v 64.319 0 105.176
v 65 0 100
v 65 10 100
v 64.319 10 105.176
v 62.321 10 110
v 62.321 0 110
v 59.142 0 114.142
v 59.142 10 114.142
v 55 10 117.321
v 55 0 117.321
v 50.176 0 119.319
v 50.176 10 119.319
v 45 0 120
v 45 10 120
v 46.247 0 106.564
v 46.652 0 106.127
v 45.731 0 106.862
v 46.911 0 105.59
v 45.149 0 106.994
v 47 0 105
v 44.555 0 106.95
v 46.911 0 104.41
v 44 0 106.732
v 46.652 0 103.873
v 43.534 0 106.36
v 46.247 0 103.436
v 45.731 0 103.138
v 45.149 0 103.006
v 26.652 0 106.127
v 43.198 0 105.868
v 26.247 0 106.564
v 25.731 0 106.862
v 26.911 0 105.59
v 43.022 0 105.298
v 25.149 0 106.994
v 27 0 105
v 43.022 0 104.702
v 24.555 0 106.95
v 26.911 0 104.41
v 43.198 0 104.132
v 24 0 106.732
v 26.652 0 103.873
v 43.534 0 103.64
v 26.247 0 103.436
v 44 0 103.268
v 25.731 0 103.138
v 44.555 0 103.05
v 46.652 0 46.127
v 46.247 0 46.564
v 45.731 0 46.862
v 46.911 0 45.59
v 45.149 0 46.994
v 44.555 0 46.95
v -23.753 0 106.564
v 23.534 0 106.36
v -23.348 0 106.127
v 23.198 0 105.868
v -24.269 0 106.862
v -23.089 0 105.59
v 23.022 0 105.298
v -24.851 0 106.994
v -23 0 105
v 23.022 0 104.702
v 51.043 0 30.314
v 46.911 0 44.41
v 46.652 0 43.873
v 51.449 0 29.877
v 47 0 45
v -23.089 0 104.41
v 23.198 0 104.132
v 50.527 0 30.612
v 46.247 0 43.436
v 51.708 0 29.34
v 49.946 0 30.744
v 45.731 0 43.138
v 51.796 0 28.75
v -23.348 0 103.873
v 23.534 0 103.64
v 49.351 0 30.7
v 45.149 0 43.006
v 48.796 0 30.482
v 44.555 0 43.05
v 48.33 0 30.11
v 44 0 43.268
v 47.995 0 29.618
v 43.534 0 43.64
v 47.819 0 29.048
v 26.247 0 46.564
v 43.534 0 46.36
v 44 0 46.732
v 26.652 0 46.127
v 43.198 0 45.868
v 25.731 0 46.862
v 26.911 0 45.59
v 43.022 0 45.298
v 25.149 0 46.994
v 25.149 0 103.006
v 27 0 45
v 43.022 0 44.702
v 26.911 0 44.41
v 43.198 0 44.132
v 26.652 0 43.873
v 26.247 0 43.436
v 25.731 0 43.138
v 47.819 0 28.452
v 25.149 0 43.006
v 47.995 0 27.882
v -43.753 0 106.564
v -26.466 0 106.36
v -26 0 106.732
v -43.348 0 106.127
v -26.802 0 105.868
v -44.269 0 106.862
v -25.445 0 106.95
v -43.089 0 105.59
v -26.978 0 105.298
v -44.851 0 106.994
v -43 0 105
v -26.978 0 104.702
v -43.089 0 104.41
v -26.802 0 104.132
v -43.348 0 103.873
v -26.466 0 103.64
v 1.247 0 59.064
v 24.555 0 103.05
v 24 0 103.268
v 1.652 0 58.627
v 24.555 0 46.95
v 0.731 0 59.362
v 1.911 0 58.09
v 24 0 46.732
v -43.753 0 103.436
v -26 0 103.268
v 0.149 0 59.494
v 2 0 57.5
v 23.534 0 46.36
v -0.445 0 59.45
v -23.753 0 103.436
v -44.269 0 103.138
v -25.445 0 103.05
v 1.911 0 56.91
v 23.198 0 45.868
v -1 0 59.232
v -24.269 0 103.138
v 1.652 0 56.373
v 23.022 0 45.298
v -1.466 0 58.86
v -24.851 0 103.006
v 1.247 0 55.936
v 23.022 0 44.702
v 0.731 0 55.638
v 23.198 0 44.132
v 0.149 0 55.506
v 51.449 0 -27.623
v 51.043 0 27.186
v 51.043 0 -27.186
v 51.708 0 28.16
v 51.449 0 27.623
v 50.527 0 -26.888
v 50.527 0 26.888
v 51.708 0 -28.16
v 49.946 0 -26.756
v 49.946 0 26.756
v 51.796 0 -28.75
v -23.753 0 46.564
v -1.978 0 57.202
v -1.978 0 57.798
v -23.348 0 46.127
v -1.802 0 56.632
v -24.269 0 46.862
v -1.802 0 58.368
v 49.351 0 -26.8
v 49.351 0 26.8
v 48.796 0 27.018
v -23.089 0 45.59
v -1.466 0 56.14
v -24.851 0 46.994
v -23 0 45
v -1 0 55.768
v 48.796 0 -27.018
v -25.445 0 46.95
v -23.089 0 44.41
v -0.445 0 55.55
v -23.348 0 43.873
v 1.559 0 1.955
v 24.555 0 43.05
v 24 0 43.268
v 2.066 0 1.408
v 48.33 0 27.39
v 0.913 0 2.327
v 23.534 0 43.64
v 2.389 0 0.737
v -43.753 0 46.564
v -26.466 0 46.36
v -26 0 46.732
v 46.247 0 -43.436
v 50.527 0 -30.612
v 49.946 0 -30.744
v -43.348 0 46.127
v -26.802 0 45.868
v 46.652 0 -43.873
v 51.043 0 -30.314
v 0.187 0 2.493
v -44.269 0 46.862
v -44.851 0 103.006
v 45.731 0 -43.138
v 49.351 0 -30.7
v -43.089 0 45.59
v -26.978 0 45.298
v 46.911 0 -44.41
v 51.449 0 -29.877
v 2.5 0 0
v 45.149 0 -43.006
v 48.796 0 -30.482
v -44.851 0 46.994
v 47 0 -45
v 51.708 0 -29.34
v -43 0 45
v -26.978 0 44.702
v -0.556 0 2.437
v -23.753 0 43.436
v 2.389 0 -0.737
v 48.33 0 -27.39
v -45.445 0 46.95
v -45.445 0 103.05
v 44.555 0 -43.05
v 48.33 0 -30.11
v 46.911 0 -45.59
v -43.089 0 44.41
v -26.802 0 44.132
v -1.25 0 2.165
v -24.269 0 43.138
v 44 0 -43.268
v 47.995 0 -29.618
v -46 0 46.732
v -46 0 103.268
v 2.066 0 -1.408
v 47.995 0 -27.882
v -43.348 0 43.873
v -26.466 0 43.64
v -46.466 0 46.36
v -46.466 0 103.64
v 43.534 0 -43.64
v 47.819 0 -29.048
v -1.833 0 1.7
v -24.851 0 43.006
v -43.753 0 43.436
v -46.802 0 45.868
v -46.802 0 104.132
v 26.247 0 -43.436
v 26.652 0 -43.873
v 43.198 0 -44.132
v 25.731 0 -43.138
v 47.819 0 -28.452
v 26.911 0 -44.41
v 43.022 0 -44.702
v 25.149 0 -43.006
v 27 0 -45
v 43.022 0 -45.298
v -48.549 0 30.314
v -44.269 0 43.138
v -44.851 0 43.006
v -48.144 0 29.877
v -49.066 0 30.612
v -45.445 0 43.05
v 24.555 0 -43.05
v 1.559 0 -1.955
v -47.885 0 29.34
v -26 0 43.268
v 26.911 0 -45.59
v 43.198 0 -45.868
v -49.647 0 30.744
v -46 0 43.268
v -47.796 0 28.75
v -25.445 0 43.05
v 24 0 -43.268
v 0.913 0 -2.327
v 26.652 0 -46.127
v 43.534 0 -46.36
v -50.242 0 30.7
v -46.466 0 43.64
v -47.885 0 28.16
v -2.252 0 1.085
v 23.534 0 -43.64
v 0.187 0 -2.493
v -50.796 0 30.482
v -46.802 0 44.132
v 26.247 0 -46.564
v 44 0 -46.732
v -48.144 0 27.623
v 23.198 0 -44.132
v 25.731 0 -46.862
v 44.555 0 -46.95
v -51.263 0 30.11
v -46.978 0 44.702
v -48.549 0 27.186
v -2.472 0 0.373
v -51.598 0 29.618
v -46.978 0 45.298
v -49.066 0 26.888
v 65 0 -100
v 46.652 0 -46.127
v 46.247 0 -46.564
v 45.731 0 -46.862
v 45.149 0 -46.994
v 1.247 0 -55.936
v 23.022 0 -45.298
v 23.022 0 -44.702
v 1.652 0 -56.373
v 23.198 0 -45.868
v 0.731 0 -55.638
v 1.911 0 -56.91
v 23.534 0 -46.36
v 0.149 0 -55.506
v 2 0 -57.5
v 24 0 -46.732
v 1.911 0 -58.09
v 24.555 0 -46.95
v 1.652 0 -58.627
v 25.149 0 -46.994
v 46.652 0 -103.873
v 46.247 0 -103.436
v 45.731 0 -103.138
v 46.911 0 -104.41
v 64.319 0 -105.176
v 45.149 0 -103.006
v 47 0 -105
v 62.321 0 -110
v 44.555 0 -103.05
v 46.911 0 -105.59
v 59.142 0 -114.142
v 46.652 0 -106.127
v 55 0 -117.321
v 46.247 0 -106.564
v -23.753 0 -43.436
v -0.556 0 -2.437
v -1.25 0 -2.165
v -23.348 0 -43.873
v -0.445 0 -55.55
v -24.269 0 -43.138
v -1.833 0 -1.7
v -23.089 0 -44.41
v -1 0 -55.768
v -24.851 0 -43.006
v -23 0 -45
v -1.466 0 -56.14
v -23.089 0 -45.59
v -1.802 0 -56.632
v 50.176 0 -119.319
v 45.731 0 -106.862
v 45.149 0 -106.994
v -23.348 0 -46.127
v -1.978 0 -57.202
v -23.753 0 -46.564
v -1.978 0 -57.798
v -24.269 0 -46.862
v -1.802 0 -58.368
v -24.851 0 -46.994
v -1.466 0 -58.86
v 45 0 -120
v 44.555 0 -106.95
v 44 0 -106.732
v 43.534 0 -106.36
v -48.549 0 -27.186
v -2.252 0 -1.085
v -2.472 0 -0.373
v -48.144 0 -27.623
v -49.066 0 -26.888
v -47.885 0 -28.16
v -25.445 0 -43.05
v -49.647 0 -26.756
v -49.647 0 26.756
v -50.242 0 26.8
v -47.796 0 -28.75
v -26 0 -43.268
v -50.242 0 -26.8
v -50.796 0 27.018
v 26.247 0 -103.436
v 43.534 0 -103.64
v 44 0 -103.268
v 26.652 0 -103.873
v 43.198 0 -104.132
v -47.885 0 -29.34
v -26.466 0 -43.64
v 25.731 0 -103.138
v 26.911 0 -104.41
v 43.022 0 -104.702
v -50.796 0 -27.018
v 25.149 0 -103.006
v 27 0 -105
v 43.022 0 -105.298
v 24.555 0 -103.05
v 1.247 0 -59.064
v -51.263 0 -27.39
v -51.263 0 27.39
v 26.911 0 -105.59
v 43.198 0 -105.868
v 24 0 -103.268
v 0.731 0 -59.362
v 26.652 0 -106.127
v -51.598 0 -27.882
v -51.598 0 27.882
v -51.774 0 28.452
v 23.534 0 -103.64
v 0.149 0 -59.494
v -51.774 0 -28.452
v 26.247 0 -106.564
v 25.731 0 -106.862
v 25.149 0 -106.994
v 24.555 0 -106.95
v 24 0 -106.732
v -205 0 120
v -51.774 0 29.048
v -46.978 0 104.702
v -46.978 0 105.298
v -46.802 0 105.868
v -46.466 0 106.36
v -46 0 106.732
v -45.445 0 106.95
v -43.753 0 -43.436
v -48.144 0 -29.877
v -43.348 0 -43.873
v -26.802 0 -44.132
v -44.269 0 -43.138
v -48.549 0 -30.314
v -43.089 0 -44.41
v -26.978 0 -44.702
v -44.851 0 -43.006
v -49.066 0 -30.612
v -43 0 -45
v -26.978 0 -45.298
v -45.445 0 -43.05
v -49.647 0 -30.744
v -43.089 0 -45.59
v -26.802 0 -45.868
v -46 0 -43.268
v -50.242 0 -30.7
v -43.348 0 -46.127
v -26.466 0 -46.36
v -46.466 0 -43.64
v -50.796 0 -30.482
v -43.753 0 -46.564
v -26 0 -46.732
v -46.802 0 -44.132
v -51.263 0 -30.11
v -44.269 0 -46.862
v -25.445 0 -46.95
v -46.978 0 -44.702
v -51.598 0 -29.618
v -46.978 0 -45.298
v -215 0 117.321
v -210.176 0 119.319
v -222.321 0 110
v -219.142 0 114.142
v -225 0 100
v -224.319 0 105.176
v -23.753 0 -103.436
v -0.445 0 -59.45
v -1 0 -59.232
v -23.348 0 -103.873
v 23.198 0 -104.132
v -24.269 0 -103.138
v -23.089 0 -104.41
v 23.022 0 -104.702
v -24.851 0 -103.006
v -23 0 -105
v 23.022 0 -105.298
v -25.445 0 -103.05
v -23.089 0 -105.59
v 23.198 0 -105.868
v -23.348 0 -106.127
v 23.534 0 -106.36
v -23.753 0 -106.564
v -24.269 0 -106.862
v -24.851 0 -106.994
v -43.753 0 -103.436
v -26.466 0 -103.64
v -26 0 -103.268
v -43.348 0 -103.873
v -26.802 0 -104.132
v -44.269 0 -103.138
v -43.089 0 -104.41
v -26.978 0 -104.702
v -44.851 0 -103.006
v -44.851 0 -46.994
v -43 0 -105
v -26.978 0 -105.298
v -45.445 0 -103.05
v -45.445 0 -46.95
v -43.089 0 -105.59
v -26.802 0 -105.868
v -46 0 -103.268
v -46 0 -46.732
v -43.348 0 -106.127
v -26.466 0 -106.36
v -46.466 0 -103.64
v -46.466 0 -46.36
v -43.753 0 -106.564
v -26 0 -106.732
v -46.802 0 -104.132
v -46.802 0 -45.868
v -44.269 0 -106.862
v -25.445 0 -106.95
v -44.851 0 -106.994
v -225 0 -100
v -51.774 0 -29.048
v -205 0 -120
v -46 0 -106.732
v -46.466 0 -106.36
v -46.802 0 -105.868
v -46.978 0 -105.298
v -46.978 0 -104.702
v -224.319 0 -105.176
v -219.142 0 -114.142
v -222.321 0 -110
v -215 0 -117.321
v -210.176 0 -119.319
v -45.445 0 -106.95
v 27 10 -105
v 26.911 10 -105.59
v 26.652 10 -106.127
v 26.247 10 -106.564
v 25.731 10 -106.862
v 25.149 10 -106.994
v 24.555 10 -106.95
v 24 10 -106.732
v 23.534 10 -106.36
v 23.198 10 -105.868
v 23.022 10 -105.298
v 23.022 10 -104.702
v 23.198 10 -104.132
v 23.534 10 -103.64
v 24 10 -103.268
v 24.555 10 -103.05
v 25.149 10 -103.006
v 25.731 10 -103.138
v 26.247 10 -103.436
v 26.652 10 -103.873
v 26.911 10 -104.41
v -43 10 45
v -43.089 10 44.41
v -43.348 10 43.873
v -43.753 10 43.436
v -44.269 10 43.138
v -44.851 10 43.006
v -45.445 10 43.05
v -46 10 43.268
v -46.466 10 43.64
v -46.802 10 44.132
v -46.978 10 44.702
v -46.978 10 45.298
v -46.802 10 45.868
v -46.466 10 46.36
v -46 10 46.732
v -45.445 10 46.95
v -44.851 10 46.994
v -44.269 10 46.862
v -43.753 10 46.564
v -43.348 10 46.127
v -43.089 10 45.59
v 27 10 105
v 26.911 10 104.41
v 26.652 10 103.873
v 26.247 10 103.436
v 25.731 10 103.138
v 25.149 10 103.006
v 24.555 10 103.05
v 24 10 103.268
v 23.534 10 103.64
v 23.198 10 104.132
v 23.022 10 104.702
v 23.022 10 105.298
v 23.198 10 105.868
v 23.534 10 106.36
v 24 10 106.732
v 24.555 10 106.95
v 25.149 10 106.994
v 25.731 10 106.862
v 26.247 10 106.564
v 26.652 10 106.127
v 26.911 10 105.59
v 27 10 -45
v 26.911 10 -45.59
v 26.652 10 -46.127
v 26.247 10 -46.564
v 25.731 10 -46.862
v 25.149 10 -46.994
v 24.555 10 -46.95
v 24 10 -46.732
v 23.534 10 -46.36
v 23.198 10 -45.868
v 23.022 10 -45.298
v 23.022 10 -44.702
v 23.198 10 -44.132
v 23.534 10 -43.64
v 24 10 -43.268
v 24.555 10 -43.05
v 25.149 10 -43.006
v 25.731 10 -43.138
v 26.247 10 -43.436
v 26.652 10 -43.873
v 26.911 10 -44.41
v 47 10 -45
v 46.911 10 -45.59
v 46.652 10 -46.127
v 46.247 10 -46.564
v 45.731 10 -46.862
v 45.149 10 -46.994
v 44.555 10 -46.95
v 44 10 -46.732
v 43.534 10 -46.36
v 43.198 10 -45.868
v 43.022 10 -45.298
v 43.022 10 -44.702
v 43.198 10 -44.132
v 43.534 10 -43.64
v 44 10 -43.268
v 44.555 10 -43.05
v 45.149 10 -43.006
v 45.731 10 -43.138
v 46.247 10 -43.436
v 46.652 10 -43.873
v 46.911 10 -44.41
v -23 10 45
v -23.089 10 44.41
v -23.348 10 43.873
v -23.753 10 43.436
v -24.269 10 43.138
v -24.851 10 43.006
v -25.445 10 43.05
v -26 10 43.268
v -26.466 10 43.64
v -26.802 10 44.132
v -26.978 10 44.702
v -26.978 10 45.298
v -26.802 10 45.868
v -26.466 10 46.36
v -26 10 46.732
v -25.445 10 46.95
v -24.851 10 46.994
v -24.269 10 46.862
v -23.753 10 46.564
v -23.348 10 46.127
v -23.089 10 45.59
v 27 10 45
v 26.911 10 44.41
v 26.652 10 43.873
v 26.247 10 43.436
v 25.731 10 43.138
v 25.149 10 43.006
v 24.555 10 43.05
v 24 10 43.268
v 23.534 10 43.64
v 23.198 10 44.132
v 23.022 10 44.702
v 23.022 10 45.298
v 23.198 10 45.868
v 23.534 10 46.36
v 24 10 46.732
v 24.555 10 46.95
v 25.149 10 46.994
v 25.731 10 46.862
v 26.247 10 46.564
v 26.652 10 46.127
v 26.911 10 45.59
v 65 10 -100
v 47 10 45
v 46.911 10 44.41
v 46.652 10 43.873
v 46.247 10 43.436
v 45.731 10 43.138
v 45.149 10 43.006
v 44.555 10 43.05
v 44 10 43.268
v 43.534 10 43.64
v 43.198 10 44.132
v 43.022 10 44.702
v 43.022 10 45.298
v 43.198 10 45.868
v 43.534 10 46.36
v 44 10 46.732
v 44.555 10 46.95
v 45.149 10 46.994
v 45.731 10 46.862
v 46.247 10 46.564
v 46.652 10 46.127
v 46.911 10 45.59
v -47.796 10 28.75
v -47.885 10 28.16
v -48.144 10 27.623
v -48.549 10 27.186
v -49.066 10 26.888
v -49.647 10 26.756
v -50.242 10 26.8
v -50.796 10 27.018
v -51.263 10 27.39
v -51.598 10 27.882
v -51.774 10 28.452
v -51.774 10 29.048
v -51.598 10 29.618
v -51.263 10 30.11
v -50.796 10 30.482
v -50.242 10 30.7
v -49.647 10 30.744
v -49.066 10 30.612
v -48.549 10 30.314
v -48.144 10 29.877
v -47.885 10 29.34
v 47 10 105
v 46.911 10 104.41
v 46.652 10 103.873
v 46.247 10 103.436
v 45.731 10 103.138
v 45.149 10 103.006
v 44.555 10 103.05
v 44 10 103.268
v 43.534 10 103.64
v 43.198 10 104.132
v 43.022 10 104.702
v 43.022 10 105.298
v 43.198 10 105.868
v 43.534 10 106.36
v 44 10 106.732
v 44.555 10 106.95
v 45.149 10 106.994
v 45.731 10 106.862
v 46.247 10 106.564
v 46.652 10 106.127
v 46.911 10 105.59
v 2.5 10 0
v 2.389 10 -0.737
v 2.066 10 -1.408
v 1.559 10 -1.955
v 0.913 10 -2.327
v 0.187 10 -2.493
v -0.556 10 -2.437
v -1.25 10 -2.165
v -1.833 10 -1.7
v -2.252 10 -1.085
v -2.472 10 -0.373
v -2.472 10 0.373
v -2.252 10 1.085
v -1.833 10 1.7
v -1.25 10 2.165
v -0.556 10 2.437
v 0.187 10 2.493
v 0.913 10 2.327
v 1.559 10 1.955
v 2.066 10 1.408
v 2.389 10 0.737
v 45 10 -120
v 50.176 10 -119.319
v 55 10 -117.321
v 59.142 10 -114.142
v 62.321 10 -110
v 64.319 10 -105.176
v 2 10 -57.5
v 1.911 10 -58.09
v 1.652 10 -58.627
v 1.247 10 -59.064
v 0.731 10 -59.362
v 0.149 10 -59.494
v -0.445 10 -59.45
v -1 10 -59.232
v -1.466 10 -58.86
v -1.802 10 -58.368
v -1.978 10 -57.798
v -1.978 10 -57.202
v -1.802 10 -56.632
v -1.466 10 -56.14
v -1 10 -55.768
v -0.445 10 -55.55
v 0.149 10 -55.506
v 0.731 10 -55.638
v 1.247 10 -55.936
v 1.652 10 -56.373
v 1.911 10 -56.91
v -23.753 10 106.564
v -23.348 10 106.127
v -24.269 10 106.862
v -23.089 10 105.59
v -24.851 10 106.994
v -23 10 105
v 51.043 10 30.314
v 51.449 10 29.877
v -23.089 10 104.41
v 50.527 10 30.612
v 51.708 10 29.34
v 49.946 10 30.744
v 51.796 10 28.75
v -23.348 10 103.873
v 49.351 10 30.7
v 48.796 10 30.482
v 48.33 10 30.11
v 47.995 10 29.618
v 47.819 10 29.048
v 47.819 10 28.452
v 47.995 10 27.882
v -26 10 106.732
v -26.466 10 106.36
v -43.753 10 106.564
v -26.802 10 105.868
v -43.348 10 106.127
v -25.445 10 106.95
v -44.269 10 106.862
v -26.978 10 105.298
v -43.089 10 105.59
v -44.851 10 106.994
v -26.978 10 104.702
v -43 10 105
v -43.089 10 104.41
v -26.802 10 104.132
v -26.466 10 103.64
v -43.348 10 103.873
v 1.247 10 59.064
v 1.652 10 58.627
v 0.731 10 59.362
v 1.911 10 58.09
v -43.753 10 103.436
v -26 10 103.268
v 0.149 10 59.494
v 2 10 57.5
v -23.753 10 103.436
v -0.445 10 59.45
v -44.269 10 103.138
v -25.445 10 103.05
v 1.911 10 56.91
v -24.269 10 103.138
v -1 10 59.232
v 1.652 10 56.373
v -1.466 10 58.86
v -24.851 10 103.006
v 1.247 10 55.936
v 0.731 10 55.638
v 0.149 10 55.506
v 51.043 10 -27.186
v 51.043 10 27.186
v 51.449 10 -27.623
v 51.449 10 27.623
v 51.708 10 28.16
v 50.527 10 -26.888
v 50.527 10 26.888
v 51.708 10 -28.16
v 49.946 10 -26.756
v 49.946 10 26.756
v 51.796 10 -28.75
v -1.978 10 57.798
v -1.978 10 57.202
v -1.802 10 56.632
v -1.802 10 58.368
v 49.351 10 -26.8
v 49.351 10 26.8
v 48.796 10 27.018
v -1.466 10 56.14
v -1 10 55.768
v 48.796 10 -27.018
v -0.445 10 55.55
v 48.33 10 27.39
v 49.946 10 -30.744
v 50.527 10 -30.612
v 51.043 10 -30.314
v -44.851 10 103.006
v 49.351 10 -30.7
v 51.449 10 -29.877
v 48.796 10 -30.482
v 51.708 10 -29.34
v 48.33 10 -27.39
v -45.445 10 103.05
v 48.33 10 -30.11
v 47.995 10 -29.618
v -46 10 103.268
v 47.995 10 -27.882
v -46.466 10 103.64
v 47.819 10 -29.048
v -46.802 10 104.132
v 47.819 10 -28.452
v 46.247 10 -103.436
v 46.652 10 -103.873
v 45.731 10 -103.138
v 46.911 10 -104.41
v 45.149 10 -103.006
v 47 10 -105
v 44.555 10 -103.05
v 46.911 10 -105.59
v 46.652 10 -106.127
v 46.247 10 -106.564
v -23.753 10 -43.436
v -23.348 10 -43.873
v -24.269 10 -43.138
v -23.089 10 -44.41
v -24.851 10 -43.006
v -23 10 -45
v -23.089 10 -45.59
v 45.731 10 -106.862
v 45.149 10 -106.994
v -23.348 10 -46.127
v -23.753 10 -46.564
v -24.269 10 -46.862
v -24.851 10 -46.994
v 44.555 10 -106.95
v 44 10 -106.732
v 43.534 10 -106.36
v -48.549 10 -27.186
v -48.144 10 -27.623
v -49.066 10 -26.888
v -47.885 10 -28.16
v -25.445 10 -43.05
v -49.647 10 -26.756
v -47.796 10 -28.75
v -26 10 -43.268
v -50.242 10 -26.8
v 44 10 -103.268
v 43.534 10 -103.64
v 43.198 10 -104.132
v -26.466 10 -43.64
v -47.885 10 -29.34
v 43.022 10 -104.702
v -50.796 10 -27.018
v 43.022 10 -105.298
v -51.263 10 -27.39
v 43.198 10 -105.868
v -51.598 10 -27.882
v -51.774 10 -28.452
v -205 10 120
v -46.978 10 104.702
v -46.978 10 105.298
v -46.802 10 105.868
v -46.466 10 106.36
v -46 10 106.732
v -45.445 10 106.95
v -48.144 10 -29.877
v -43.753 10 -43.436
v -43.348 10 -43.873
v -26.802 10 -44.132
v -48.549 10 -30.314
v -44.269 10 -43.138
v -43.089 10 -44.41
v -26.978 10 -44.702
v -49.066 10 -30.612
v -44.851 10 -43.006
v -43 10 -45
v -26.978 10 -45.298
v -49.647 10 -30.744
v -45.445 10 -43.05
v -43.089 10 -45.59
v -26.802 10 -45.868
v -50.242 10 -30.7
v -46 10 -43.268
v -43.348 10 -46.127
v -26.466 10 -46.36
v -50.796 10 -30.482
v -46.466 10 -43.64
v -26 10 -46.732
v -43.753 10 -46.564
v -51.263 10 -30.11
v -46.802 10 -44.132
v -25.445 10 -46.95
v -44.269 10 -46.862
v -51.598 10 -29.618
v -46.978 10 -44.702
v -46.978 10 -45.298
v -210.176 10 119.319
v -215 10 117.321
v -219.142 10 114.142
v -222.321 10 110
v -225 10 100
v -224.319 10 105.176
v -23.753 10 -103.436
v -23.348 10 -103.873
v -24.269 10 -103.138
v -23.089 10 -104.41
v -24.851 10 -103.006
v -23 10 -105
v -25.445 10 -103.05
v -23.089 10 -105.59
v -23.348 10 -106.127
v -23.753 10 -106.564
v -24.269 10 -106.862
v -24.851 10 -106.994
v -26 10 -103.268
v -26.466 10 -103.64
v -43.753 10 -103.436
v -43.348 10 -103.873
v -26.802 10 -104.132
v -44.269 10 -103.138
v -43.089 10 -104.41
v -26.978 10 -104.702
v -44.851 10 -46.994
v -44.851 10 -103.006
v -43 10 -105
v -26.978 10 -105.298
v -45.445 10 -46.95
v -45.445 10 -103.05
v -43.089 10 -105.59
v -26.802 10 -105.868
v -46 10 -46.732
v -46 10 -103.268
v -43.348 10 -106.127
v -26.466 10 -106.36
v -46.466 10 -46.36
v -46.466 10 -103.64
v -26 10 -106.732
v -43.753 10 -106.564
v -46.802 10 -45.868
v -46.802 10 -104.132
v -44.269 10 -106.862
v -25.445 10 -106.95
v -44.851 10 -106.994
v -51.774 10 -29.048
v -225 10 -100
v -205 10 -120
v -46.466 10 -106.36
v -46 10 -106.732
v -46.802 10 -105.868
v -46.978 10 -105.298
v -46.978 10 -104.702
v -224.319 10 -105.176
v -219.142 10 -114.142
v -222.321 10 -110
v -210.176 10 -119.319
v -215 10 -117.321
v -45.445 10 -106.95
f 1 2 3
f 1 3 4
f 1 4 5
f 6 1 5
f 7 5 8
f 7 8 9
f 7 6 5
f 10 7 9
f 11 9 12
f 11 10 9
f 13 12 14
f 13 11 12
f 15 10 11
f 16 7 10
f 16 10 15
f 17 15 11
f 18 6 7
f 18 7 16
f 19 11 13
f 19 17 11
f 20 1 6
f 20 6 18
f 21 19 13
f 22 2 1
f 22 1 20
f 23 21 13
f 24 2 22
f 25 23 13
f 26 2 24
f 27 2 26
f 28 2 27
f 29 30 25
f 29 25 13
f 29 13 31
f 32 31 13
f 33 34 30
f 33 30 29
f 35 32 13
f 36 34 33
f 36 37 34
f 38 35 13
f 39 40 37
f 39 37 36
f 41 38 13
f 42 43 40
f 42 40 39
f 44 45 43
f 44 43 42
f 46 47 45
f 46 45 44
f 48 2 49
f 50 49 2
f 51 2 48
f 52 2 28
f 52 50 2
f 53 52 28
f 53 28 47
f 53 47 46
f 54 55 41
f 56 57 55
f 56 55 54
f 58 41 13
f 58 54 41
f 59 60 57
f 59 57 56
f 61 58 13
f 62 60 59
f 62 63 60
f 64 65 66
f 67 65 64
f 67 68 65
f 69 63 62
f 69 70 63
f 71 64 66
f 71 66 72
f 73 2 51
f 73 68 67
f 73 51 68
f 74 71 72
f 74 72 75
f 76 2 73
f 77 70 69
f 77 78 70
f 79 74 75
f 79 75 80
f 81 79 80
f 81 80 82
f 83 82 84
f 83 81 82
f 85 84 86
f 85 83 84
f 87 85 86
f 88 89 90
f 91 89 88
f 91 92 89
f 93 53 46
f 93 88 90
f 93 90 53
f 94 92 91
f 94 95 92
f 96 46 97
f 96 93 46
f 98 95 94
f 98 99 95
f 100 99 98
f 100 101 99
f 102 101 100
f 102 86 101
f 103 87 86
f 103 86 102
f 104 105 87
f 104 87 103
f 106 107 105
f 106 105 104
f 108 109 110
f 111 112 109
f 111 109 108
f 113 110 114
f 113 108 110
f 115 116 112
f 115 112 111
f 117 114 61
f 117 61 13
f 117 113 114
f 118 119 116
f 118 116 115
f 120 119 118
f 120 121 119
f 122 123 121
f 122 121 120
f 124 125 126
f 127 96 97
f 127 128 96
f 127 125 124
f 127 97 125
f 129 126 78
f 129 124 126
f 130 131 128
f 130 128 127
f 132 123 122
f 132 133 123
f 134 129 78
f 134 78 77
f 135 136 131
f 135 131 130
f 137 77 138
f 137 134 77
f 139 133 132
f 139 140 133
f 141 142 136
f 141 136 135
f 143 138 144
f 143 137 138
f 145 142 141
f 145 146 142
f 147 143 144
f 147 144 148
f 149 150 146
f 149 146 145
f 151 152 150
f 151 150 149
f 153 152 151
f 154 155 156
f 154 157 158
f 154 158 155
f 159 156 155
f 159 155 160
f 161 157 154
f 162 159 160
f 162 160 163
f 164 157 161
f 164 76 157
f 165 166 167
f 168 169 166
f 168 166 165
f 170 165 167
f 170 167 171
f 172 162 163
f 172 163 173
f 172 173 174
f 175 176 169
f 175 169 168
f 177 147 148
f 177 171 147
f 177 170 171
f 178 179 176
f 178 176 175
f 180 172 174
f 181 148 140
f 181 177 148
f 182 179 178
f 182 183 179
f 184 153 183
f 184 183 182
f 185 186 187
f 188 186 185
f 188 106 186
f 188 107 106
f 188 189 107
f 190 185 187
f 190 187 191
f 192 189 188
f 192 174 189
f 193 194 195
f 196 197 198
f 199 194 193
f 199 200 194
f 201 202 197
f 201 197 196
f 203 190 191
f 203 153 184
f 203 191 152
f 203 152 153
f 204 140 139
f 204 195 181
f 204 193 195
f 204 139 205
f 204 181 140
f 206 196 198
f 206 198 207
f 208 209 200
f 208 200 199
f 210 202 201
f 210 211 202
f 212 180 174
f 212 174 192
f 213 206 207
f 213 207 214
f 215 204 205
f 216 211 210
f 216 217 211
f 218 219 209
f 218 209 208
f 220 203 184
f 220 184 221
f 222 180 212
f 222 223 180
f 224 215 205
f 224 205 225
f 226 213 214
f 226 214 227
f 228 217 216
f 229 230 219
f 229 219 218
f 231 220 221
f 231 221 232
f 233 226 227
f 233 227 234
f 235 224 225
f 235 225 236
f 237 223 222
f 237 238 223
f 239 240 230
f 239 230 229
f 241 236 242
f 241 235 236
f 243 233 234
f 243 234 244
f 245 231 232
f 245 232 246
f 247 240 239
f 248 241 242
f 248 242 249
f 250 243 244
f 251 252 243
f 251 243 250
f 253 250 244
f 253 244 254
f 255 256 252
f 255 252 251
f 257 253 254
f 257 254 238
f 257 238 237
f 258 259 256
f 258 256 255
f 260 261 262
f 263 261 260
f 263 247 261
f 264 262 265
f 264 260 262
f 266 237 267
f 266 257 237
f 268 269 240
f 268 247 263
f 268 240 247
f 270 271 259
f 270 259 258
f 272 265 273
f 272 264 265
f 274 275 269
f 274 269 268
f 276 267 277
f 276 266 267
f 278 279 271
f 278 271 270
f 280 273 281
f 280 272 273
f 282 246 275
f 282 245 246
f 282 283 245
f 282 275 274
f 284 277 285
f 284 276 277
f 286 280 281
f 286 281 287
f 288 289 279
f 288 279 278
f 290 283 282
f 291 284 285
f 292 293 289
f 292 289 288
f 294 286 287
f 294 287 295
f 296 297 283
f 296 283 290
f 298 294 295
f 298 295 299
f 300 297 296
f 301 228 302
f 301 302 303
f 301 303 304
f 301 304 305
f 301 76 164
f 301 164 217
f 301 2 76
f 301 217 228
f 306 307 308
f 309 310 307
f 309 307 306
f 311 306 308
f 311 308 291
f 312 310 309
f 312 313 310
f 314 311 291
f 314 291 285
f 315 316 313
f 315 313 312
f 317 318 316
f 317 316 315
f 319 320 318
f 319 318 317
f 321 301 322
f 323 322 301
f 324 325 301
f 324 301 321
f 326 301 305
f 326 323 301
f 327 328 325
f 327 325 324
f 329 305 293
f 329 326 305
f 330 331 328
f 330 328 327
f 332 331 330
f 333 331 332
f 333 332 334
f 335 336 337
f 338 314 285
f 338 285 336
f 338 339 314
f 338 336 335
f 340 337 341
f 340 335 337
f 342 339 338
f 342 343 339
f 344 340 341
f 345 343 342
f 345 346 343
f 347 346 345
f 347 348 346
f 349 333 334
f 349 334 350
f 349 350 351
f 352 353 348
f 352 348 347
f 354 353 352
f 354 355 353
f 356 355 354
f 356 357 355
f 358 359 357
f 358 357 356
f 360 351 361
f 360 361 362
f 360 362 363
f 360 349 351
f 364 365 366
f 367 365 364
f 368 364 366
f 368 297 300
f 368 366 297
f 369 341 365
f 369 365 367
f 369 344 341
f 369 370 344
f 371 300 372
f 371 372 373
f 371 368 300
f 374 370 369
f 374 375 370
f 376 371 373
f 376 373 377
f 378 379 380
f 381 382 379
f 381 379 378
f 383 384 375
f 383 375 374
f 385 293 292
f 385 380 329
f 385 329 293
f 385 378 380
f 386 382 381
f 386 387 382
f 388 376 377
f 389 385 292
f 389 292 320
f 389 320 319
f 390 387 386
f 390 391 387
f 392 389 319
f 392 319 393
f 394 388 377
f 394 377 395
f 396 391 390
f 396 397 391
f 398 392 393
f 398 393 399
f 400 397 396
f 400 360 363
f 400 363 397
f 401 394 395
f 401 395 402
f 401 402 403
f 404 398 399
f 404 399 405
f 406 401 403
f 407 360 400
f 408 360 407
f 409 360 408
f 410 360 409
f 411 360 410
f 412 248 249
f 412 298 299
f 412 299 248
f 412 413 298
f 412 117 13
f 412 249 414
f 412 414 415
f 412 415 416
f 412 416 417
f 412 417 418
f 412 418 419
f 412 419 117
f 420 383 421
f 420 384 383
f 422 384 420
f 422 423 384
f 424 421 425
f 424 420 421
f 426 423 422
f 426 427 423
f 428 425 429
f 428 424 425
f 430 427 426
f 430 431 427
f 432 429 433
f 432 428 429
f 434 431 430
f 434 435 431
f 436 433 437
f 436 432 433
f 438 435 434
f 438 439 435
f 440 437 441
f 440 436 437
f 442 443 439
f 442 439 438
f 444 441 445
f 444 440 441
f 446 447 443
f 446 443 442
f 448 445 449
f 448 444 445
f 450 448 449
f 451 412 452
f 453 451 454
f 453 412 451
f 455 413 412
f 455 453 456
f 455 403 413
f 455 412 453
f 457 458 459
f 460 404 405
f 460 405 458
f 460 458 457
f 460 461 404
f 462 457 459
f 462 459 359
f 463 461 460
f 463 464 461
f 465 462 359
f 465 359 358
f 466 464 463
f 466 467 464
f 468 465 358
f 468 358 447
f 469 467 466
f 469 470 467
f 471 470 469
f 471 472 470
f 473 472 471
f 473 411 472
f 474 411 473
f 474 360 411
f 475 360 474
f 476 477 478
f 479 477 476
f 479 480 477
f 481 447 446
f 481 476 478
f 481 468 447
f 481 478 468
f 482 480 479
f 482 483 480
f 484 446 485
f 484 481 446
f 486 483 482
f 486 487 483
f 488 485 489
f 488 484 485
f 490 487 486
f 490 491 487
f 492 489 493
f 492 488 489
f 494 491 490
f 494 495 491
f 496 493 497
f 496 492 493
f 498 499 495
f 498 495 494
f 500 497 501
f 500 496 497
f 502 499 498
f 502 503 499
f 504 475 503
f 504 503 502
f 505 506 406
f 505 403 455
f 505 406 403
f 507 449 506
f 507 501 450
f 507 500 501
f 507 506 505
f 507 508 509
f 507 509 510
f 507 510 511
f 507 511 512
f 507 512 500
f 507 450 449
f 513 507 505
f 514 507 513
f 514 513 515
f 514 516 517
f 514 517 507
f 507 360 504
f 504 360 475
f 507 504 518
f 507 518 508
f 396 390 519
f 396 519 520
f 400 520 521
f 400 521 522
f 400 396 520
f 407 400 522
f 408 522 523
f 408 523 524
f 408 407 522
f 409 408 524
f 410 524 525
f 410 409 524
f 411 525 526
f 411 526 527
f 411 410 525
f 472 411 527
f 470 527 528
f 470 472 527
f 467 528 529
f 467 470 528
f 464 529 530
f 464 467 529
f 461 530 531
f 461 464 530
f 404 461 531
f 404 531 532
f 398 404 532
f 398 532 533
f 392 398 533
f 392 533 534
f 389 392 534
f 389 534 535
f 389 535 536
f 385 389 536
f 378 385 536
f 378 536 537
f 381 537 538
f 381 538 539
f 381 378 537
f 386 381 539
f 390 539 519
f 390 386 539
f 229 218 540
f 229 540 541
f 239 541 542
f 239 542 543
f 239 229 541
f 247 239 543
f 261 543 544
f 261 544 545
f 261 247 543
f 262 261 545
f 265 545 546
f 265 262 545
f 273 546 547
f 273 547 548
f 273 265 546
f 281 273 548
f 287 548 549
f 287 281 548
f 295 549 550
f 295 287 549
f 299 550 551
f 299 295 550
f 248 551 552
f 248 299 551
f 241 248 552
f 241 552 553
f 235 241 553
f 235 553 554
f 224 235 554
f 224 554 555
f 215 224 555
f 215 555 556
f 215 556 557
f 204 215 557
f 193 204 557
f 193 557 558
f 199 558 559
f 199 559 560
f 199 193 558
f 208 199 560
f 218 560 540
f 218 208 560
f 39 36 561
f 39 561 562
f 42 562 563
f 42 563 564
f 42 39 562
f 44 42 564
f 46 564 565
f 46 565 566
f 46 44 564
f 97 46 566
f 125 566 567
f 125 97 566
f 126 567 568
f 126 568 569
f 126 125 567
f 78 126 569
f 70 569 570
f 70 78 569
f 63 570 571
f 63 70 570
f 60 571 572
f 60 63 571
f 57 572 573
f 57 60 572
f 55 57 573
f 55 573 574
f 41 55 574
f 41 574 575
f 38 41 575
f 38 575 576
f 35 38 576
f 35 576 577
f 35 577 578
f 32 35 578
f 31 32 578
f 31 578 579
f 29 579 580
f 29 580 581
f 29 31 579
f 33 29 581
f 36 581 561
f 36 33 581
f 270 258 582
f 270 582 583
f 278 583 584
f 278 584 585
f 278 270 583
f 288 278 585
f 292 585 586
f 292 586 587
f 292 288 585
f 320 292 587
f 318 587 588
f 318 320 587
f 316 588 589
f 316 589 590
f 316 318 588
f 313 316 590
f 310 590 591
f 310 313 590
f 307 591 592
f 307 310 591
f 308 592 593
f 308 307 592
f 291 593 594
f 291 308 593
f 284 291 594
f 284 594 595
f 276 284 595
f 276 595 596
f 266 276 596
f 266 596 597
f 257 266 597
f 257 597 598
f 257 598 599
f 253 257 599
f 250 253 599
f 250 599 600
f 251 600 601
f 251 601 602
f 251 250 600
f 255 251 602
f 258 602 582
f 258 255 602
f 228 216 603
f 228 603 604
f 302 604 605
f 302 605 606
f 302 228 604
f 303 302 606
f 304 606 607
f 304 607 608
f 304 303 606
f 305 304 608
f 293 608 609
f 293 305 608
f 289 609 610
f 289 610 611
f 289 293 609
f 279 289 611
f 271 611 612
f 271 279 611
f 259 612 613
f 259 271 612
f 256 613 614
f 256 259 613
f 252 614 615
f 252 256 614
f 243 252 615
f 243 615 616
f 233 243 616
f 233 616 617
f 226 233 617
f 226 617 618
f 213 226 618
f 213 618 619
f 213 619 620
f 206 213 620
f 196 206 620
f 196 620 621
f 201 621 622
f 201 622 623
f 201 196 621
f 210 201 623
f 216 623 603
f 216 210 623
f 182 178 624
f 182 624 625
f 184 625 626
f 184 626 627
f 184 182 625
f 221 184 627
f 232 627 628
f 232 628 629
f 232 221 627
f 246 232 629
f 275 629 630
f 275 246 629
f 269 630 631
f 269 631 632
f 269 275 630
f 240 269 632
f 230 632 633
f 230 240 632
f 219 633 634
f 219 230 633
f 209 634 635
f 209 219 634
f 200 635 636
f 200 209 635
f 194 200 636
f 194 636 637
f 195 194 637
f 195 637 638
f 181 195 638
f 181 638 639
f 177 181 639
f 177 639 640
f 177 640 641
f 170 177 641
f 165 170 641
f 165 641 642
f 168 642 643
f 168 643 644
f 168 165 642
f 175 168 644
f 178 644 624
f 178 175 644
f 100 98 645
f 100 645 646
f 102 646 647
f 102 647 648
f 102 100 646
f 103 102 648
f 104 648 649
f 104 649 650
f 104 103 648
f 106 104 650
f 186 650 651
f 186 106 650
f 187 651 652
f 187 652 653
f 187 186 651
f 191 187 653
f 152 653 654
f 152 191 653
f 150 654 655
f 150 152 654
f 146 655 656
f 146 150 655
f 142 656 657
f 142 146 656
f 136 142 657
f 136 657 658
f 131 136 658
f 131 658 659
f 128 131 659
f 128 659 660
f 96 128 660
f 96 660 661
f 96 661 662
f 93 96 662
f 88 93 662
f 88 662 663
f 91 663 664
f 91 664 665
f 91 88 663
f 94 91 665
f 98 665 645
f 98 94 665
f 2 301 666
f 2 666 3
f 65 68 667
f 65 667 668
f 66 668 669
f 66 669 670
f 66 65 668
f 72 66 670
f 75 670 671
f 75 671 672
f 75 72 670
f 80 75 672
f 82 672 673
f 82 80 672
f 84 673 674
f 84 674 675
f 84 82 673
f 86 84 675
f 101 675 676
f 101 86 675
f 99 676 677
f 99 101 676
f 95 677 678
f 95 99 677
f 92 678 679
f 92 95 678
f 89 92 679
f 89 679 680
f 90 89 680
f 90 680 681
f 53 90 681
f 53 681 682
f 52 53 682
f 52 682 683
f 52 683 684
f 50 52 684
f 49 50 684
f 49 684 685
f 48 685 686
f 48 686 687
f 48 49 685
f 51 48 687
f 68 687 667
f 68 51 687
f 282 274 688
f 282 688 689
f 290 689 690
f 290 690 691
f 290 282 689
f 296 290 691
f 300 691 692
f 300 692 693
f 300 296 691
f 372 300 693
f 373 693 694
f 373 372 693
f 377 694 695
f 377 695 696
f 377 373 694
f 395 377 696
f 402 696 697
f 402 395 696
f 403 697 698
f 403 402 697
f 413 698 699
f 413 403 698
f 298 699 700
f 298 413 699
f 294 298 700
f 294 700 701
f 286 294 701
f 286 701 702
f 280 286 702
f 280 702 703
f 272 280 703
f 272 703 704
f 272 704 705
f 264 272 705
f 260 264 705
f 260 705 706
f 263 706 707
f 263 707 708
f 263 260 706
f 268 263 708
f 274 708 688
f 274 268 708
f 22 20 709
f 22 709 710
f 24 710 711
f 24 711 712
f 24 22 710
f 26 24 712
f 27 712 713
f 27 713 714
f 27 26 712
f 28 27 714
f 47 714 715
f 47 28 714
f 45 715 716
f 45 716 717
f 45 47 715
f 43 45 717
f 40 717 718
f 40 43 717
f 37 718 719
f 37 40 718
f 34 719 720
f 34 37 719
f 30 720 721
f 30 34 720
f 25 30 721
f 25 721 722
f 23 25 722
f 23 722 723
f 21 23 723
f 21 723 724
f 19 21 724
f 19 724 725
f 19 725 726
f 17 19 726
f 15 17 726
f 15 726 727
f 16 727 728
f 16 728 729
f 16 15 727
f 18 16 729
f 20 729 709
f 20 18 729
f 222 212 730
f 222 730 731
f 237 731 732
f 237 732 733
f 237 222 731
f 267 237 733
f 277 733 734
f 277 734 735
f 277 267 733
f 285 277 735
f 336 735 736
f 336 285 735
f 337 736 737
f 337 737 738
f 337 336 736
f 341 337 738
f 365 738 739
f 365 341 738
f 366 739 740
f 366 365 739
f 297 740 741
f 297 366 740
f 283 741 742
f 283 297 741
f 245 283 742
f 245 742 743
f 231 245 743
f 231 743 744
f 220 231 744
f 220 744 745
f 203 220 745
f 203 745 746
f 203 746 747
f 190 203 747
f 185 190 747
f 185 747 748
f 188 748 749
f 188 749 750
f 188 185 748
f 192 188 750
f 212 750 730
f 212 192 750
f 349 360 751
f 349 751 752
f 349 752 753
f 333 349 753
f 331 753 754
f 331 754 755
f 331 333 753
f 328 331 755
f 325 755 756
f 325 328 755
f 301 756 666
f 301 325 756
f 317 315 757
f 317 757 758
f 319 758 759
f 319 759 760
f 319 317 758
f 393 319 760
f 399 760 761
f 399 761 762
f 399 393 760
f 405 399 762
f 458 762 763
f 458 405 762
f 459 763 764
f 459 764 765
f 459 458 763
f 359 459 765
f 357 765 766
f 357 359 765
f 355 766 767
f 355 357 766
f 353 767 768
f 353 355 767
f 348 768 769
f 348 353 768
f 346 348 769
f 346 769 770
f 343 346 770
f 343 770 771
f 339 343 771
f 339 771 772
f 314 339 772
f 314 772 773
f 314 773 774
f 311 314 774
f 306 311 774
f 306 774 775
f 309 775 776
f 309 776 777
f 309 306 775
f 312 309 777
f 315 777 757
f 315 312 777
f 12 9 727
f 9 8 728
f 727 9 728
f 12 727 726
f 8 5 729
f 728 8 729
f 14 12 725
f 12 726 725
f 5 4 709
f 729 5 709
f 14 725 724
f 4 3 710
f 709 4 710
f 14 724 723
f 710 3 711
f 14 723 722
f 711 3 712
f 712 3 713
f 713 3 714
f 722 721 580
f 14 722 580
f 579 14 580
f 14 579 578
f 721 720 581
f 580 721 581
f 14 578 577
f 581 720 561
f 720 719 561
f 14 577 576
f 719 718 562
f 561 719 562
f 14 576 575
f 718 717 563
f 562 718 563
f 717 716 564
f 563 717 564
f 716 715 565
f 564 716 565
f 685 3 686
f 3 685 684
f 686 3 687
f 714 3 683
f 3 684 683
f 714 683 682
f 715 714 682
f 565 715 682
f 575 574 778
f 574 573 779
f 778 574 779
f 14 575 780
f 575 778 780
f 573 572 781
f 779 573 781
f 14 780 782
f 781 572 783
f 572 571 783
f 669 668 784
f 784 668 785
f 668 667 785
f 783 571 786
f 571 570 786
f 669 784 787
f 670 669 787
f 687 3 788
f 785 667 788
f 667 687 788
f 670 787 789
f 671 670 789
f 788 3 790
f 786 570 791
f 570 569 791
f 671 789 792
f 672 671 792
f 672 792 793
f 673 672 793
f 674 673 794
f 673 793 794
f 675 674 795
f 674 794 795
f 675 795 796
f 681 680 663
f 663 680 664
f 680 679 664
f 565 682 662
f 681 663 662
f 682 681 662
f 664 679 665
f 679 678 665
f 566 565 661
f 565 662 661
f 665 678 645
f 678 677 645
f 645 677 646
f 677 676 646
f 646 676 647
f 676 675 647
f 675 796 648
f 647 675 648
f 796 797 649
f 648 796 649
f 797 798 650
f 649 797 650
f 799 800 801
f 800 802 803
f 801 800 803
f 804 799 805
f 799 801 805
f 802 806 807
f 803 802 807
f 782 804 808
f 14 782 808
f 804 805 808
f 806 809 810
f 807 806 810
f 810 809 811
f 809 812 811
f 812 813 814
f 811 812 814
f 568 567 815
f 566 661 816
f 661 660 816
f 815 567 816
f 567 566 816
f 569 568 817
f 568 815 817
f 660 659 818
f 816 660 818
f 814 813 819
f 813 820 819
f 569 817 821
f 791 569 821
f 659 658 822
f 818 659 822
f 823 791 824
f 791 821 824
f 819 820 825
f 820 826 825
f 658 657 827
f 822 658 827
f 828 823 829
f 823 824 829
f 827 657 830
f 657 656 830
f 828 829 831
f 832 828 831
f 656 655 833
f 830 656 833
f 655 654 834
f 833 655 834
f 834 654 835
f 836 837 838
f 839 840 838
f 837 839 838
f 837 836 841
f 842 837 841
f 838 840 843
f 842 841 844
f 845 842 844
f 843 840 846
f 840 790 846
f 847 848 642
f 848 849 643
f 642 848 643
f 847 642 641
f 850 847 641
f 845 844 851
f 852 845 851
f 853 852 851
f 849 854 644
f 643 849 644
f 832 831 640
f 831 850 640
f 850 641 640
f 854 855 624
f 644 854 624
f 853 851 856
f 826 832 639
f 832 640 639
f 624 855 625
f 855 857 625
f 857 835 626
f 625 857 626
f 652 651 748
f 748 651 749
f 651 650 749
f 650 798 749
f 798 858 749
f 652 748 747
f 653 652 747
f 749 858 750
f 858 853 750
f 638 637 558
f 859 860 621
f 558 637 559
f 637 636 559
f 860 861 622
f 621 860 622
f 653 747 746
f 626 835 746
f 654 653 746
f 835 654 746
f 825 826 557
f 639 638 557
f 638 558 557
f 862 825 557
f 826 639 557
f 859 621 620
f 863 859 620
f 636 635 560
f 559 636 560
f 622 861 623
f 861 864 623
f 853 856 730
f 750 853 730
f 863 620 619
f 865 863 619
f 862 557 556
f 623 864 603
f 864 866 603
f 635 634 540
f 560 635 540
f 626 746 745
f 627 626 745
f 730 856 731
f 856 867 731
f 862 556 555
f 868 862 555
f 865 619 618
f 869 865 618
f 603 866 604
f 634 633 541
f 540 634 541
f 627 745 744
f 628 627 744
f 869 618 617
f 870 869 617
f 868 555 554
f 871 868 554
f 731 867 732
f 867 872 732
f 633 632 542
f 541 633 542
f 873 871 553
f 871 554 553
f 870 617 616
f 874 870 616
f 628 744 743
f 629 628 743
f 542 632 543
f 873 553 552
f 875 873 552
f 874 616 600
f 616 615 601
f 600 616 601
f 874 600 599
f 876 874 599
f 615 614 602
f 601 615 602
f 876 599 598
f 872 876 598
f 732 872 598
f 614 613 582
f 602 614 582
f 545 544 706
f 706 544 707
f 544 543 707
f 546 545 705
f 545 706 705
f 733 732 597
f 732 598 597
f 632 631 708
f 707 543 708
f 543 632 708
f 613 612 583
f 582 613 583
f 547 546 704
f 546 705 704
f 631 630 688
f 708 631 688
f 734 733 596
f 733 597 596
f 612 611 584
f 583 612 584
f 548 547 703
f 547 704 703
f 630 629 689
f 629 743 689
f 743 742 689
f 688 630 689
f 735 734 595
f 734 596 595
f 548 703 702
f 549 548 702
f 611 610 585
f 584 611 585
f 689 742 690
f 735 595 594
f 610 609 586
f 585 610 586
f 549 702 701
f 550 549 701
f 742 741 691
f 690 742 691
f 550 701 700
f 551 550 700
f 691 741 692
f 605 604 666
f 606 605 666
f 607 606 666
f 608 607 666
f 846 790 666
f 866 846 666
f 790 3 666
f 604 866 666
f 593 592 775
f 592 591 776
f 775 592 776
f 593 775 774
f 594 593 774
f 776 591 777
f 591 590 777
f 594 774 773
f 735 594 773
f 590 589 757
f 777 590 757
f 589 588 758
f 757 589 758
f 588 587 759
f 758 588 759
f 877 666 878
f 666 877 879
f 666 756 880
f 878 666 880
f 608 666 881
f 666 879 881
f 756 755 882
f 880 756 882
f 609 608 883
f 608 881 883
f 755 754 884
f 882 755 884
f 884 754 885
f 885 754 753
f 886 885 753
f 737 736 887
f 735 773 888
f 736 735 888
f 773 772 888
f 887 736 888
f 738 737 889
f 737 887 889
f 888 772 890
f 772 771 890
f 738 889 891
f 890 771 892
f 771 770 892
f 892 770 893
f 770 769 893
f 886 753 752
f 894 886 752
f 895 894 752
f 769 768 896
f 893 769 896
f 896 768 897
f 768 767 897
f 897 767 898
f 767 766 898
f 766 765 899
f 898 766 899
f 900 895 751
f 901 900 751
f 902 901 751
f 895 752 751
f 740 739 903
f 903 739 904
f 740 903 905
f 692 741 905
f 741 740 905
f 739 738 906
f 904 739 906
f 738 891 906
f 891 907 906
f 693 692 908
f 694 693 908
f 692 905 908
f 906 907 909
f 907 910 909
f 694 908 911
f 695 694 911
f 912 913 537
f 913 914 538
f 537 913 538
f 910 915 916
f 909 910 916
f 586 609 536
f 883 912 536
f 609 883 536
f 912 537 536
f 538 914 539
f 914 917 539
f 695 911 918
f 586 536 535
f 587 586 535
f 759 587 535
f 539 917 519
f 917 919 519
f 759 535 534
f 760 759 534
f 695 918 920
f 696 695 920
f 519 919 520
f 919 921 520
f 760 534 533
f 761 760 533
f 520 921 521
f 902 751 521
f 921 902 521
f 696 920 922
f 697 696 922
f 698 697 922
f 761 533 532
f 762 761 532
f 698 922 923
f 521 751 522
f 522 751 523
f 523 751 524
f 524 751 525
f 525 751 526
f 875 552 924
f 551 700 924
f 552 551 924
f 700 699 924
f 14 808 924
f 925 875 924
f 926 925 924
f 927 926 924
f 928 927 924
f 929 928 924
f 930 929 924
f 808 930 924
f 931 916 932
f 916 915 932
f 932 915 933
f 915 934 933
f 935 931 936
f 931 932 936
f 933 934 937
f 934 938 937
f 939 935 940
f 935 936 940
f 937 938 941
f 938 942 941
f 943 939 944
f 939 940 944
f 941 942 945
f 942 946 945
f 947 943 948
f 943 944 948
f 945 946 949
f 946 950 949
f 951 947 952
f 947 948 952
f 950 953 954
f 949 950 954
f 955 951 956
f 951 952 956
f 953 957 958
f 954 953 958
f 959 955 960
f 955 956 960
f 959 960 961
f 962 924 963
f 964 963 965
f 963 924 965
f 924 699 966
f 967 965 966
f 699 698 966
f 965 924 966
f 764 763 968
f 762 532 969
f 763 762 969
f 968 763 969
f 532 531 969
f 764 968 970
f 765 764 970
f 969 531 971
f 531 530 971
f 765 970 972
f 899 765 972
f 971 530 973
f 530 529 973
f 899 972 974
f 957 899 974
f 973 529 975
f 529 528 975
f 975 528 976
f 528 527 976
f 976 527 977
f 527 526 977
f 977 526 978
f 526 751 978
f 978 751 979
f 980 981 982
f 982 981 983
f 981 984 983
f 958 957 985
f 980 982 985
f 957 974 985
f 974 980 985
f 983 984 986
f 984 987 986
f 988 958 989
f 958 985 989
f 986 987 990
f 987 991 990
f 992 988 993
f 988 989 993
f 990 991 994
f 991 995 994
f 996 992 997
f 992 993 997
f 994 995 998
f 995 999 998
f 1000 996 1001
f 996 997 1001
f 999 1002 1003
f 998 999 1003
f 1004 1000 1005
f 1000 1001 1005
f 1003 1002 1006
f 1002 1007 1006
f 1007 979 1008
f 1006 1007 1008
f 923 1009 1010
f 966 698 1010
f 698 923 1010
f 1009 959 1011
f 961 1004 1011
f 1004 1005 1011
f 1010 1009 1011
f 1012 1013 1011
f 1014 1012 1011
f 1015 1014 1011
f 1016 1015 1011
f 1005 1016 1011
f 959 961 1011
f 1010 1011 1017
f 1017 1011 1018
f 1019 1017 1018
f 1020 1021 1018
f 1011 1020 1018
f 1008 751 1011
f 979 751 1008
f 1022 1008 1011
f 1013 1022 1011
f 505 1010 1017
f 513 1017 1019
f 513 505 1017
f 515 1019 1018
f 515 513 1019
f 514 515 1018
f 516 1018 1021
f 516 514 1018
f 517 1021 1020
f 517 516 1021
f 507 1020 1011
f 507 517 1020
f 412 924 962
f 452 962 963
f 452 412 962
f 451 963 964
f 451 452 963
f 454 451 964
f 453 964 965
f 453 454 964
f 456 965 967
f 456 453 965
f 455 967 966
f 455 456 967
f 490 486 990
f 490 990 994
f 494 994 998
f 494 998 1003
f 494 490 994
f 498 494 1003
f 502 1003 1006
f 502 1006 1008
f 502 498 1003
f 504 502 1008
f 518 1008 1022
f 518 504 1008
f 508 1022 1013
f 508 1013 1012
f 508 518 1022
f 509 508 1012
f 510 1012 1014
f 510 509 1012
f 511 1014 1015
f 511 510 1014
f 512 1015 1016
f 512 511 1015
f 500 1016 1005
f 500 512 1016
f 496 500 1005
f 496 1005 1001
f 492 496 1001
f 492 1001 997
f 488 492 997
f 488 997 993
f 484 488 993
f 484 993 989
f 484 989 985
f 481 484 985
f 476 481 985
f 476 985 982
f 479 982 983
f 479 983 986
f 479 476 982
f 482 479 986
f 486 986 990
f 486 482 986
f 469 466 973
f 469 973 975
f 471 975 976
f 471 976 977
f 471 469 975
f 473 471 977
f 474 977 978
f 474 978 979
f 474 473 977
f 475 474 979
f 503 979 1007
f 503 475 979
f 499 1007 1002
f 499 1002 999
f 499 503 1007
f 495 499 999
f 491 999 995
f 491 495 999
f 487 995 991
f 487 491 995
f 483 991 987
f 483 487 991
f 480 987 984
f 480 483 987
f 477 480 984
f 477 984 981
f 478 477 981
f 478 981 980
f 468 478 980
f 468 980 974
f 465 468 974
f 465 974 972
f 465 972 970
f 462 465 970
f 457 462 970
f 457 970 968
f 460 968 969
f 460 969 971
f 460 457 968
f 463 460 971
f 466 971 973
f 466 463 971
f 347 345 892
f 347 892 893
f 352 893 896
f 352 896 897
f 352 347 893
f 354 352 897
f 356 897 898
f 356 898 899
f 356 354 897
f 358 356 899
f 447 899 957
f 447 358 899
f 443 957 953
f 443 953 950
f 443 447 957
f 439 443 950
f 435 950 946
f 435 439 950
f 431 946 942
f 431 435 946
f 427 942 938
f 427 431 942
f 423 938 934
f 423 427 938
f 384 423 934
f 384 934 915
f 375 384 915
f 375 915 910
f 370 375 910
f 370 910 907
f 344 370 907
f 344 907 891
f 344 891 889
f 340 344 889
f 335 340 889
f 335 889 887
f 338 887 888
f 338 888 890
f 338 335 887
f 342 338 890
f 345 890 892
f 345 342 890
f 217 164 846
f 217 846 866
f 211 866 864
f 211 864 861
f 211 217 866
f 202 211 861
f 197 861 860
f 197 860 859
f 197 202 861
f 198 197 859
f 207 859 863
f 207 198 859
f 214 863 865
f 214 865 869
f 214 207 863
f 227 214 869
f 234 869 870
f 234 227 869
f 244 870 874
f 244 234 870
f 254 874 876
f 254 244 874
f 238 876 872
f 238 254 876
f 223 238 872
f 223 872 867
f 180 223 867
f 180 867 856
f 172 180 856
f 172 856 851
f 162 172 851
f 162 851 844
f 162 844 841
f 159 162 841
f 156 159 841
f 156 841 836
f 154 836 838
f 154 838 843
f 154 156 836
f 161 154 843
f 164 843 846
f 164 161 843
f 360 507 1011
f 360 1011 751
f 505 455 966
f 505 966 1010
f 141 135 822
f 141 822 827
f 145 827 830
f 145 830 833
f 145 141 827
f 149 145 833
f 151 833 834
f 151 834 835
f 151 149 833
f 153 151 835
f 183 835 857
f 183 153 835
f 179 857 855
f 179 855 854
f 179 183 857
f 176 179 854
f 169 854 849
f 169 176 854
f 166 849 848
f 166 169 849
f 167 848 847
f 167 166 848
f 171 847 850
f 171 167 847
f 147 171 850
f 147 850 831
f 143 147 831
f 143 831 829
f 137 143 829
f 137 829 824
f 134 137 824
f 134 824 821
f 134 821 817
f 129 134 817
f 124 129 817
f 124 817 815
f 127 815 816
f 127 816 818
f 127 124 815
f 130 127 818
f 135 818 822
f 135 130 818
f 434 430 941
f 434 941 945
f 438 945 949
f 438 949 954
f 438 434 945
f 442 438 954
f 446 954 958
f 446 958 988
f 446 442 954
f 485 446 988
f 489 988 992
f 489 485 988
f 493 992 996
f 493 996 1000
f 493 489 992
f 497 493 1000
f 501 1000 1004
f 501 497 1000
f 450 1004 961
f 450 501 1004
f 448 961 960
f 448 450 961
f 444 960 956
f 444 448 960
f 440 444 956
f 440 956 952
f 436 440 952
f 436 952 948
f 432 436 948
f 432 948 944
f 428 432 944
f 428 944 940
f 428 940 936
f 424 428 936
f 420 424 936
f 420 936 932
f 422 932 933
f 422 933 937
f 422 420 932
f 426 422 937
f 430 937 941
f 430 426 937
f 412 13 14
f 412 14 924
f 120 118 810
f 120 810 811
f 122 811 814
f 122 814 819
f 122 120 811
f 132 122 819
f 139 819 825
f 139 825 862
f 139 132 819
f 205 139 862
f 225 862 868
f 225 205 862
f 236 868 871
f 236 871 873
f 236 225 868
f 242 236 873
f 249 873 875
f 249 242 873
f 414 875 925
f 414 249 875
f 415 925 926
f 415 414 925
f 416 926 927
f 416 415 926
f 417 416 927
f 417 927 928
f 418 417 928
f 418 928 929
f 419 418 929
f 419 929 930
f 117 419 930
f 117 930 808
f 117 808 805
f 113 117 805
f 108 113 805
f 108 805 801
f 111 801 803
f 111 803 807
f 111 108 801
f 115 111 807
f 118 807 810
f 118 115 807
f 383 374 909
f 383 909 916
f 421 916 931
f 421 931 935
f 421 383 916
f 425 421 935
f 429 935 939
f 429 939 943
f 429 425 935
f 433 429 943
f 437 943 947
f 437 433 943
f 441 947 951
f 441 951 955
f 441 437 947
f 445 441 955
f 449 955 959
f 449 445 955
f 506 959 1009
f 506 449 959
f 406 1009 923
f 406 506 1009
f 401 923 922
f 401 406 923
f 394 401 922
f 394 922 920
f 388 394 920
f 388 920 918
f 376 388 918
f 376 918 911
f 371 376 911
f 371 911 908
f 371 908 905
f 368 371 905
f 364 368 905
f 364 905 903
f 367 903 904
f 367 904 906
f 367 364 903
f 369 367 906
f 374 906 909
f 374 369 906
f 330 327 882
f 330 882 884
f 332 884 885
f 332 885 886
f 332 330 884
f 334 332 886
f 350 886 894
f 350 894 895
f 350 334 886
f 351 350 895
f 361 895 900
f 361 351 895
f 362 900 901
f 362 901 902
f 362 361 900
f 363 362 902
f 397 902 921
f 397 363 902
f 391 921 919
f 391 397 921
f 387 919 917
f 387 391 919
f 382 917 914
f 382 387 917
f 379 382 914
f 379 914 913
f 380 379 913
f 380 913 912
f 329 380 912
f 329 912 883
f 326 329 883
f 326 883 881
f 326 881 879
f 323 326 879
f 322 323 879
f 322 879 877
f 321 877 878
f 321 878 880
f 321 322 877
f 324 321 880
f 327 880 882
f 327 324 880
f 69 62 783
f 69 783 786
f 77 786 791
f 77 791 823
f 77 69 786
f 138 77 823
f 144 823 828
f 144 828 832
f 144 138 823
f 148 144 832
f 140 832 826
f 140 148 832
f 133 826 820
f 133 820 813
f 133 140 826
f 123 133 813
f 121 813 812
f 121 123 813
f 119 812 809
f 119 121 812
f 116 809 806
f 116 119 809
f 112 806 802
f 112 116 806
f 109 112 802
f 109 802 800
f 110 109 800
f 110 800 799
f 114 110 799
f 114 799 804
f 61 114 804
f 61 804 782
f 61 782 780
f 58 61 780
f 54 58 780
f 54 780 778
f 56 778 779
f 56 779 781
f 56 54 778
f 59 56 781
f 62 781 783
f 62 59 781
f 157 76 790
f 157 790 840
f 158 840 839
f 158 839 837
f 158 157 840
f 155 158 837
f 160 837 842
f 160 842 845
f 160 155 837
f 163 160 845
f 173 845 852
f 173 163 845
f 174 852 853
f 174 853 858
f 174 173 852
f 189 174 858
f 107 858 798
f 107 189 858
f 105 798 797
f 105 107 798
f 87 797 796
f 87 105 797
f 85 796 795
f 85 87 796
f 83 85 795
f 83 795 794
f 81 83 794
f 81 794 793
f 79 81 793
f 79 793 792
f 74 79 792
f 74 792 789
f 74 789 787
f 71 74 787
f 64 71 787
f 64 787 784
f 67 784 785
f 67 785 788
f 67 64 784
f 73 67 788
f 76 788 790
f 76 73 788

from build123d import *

# Parameters (mm, degrees)
SKETCH1_R           = 2
SKETCH1_R_2         = 2.5
BOSS_EXTRUDE1_DEPTH = 10


with BuildPart() as part:
    # Sketch1 → Boss-Extrude1 (new body)
    with BuildSketch(Plane(origin=(0, 0, 0), x_dir=(1, 0, 0), z_dir=(0, 1, 0))):
        with BuildLine():
            Line((-205, 120), (45, 120))
            ThreePointArc((45, 120), (59.142135624, 114.142135624), (65, 100))
            Line((65, 100), (65, -100))
            ThreePointArc((65, -100), (59.142135624, -114.142135624), (45, -120))
            Line((45, -120), (-205, -120))
            ThreePointArc((-205, -120), (-219.142135624, -114.142135624), (-225, -100))
            Line((-225, -100), (-225, 100))
            ThreePointArc((-225, 100), (-219.142135624, 114.142135624), (-205, 120))
        make_face()
        with Locations((0, -57.5)):
            Circle(SKETCH1_R, mode=Mode.SUBTRACT)
        with Locations((-49.796460718, -28.75)):
            Circle(SKETCH1_R, mode=Mode.SUBTRACT)
        with Locations((-49.796460718, 28.75)):
            Circle(SKETCH1_R, mode=Mode.SUBTRACT)
        with Locations((0, 57.5)):
            Circle(SKETCH1_R, mode=Mode.SUBTRACT)
        with Locations((49.796460718, 28.75)):
            Circle(SKETCH1_R, mode=Mode.SUBTRACT)
        with Locations((49.796460718, -28.75)):
            Circle(SKETCH1_R, mode=Mode.SUBTRACT)
        Circle(SKETCH1_R_2, mode=Mode.SUBTRACT)
        with Locations((-45, 105)):
            Circle(SKETCH1_R, mode=Mode.SUBTRACT)
        with Locations((-25, 105)):
            Circle(SKETCH1_R, mode=Mode.SUBTRACT)
        with Locations((25, 105)):
            Circle(SKETCH1_R, mode=Mode.SUBTRACT)
        with Locations((45, 105)):
            Circle(SKETCH1_R, mode=Mode.SUBTRACT)
        with Locations((-45, 45)):
            Circle(SKETCH1_R, mode=Mode.SUBTRACT)
        with Locations((-25, 45)):
            Circle(SKETCH1_R, mode=Mode.SUBTRACT)
        with Locations((25, 45)):
            Circle(SKETCH1_R, mode=Mode.SUBTRACT)
        with Locations((45, 45)):
            Circle(SKETCH1_R, mode=Mode.SUBTRACT)
        with Locations((-45, -45)):
            Circle(SKETCH1_R, mode=Mode.SUBTRACT)
        with Locations((-25, -45)):
            Circle(SKETCH1_R, mode=Mode.SUBTRACT)
        with Locations((25, -45)):
            Circle(SKETCH1_R, mode=Mode.SUBTRACT)
        with Locations((45, -45)):
            Circle(SKETCH1_R, mode=Mode.SUBTRACT)
        with Locations((45, -105)):
            Circle(SKETCH1_R, mode=Mode.SUBTRACT)
        with Locations((25, -105)):
            Circle(SKETCH1_R, mode=Mode.SUBTRACT)
        with Locations((-25, -105)):
            Circle(SKETCH1_R, mode=Mode.SUBTRACT)
        with Locations((-45, -105)):
            Circle(SKETCH1_R, mode=Mode.SUBTRACT)
    extrude(amount=BOSS_EXTRUDE1_DEPTH)


solid = part.part
